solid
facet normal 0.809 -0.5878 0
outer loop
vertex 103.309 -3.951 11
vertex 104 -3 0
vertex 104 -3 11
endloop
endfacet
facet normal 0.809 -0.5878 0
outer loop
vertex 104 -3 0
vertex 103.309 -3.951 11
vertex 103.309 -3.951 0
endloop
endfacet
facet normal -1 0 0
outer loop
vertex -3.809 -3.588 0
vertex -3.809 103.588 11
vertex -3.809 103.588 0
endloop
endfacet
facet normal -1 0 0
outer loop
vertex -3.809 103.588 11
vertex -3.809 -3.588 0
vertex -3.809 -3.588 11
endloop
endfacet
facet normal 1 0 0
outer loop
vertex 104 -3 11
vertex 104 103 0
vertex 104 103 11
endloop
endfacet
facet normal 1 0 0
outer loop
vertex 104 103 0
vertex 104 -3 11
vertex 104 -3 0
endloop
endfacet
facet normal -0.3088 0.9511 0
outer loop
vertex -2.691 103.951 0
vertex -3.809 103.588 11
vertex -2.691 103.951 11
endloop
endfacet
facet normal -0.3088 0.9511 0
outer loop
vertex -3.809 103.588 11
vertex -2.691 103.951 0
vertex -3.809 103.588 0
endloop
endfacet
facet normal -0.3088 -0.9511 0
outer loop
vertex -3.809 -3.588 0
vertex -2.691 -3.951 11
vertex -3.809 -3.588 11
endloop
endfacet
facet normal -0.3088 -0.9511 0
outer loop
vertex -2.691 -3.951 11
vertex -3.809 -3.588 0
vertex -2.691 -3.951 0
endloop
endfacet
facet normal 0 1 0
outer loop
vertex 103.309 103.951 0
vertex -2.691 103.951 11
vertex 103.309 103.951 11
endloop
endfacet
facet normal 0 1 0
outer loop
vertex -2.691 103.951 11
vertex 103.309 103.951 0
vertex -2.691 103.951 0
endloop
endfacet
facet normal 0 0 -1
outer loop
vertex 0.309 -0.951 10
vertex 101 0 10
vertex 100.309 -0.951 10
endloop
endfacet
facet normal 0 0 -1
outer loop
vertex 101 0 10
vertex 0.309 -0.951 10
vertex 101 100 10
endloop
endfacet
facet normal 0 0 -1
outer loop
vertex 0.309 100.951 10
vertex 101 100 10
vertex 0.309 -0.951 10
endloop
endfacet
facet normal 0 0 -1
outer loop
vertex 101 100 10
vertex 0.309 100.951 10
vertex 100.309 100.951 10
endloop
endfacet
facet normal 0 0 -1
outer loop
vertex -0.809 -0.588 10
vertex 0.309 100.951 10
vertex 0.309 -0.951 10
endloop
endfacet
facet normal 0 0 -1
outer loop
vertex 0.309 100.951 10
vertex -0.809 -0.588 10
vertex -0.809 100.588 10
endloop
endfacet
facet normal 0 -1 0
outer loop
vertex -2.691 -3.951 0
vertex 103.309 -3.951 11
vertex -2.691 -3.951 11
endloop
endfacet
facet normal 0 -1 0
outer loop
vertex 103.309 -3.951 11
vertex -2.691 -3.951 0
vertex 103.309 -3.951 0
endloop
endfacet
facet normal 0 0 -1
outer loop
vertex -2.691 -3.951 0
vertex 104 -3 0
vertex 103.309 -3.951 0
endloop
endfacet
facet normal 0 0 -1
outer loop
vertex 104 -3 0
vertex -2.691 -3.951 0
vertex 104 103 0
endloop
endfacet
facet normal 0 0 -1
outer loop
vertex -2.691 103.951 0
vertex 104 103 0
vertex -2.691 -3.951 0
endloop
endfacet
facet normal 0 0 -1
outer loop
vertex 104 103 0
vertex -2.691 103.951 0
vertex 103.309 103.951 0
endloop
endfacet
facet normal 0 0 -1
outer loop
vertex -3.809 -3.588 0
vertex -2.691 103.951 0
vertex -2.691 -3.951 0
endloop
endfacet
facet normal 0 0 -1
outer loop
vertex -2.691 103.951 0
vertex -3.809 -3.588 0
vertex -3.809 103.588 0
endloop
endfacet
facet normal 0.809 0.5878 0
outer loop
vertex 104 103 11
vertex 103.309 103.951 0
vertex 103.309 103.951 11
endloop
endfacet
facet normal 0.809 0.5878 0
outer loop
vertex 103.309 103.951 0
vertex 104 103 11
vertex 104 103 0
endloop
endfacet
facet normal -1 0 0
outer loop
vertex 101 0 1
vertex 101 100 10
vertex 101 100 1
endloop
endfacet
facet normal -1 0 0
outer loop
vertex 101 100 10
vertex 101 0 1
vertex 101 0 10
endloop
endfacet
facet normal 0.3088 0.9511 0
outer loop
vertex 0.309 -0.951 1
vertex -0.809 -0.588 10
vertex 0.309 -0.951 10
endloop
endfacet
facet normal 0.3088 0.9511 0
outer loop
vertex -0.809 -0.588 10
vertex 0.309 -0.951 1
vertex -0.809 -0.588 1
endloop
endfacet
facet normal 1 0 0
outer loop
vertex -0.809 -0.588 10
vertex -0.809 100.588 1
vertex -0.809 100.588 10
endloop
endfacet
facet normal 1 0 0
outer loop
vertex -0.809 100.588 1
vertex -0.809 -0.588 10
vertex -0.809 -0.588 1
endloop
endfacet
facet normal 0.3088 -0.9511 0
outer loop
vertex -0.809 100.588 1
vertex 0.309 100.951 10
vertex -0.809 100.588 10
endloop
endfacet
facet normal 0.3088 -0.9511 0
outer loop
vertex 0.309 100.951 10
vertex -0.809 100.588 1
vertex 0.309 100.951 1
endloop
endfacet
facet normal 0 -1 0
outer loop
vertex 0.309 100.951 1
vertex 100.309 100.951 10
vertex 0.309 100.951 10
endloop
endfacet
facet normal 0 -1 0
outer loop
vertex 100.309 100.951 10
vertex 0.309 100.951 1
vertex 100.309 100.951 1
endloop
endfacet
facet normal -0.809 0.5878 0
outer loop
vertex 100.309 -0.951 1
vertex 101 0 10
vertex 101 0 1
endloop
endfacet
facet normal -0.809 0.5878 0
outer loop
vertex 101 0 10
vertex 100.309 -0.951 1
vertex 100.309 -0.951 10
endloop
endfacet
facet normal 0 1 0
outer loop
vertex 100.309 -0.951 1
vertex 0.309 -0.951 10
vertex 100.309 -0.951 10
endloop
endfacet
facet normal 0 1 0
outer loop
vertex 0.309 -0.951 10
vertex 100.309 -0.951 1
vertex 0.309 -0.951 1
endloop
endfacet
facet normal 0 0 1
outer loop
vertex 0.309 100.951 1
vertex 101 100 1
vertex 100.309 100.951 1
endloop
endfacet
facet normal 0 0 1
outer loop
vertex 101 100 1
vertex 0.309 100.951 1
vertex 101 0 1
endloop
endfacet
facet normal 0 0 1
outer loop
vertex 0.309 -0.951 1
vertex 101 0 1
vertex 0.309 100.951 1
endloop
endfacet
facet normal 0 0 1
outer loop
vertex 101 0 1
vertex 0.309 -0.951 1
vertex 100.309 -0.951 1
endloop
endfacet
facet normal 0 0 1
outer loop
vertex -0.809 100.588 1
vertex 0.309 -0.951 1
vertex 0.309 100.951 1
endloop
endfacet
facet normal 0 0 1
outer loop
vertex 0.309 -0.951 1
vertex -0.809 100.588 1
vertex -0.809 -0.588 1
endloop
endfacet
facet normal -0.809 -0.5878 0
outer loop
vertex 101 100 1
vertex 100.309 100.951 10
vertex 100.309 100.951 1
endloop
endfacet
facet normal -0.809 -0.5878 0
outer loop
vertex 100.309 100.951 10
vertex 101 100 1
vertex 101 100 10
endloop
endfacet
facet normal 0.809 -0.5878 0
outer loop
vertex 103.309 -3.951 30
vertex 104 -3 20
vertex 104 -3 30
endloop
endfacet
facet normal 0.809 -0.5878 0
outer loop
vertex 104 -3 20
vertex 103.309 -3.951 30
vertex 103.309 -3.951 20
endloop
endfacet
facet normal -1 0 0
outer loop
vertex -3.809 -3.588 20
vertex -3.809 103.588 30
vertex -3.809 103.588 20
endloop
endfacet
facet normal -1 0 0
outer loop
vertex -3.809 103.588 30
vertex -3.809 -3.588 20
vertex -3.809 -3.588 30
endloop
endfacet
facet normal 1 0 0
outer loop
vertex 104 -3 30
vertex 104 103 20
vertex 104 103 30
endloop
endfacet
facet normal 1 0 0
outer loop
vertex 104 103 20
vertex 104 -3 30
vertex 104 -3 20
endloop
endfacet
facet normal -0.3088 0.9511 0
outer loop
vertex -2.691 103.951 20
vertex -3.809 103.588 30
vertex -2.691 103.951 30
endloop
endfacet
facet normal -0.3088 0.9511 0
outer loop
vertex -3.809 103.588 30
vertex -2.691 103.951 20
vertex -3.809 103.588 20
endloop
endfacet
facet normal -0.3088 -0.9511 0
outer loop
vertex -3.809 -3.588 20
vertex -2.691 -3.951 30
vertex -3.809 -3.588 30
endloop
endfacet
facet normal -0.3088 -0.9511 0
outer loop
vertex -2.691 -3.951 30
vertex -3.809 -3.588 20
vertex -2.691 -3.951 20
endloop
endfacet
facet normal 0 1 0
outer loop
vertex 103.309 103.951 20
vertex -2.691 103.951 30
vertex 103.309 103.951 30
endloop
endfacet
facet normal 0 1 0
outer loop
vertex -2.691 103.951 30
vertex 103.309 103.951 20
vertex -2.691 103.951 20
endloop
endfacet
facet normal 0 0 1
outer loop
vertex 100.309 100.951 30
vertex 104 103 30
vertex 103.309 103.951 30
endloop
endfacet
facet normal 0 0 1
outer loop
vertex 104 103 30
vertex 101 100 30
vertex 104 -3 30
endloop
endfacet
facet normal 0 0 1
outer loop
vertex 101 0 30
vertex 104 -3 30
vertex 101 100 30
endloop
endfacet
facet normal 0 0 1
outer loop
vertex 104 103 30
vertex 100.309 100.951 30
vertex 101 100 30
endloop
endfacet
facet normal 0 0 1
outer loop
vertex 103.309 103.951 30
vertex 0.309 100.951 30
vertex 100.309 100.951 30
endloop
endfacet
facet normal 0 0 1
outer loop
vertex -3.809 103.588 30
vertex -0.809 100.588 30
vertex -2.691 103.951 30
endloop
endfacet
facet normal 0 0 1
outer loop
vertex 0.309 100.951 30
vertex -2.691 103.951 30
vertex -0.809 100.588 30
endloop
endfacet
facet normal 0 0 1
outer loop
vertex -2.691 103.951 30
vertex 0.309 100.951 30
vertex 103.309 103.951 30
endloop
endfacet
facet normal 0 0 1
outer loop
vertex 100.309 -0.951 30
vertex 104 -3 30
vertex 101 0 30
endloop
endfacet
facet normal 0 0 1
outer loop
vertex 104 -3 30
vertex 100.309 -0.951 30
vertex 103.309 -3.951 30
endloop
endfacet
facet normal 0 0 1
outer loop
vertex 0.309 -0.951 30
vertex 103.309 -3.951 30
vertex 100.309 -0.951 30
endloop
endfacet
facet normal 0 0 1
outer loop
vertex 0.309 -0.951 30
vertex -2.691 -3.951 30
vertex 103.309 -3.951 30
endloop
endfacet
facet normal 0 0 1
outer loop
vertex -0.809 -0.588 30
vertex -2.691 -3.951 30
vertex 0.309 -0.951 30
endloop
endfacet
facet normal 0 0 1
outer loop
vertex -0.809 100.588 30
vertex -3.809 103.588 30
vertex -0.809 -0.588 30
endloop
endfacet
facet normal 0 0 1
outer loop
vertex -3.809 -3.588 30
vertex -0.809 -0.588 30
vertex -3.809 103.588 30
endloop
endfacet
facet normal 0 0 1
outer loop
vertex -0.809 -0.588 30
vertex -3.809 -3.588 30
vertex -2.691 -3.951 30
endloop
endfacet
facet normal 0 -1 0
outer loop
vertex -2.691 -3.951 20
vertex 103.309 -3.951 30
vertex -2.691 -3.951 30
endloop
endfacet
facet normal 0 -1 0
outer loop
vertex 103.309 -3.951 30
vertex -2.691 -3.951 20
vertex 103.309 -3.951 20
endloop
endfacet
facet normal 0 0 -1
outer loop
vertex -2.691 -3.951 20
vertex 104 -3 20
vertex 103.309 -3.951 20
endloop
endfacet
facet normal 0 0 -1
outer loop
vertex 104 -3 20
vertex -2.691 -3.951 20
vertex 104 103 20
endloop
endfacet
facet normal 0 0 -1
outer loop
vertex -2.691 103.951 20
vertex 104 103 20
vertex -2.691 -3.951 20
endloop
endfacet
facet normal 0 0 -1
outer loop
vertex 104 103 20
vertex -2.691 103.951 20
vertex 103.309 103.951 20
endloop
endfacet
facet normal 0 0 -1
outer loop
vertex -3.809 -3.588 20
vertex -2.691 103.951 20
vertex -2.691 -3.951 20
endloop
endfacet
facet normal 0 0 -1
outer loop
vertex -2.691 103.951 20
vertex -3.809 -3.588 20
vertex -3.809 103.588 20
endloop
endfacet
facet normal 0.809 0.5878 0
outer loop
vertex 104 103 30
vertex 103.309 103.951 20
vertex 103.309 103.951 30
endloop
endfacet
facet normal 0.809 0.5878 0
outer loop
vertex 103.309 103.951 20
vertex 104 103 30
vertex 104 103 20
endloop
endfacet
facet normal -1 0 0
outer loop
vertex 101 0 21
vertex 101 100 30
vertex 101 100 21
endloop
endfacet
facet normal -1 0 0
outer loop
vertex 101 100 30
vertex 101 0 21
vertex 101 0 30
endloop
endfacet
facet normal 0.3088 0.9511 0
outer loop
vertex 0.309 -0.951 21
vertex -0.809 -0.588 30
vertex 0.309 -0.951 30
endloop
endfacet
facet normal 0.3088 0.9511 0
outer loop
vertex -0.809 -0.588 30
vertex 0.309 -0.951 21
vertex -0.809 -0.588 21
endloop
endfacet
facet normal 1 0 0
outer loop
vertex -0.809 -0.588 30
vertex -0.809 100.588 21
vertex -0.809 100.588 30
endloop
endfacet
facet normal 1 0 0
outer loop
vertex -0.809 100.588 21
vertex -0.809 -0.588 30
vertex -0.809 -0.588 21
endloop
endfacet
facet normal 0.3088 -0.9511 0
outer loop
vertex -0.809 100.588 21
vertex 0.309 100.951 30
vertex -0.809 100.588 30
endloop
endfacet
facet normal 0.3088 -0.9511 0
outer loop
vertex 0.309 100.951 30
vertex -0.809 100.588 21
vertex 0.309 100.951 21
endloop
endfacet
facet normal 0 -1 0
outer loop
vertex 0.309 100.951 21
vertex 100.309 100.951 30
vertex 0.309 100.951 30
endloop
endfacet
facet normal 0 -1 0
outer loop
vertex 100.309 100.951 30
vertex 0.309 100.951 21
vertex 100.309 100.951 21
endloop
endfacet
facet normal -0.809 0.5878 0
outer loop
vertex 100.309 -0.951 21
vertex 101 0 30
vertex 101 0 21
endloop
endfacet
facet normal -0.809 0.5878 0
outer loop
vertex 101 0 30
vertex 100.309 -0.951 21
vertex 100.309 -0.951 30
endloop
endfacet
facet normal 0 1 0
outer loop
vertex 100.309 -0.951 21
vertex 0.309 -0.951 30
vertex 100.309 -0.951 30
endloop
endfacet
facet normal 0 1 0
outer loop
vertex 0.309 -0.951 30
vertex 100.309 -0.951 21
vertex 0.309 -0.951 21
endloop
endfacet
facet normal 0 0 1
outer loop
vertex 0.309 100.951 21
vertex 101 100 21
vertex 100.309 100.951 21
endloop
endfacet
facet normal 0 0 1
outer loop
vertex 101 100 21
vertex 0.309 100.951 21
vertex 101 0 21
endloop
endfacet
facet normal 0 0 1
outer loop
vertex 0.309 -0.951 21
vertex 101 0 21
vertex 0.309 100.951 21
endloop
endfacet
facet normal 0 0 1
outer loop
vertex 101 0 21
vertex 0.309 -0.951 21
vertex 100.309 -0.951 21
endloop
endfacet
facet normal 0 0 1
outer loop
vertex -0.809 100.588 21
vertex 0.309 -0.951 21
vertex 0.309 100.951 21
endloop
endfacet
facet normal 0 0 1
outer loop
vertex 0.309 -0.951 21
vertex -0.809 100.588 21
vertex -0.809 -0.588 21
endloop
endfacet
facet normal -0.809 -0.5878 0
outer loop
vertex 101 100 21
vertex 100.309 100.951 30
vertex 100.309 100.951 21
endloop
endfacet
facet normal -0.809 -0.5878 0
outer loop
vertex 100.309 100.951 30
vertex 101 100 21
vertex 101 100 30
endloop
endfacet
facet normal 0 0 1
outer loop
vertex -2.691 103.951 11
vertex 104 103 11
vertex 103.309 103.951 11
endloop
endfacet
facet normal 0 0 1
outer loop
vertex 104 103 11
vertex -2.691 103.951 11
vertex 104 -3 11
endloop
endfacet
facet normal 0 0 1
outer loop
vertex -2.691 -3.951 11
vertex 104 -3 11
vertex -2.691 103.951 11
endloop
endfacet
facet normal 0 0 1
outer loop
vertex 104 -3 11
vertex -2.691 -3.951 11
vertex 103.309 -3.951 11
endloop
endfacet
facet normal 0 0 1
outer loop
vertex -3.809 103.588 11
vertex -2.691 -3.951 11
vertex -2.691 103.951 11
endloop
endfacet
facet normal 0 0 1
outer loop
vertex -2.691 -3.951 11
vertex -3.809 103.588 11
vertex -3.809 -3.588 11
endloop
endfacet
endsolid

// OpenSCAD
// file: case.scad
module case (width, length, wall_height, wall_thickness, x_offset, y_offset, z_offset){
    //Negative space
    top_right_point = [width + x_offset, length + y_offset, z_offset];
    top_left_point = [width + x_offset, y_offset, z_offset];
    bottom_right_point = [x_offset, length + y_offset, z_offset];
    bottom_left_point = [x_offset, y_offset, z_offset];

    //Base space
    top_right_point_base = [width + wall_thickness, length + wall_thickness, 0];
    top_left_point_base = [width + wall_thickness, -wall_thickness, 0];
    bottom_right_point_base = [-wall_thickness, length + wall_thickness, 0];
    bottom_left_point_base = [-wall_thickness, -wall_thickness, 0];
    
    //Lists for the for loops
    base_points = [top_right_point_base, top_left_point_base, bottom_right_point_base, bottom_left_point_base];
    points = [top_right_point, top_left_point, bottom_right_point, bottom_left_point];

    difference(){
        hull(){
            for (point = base_points){
                translate(point){
                    cylinder(wall_height);
                }
            }
        }
        hull(){
            for (point = points){
                translate(point){
                    cylinder(wall_height);
                }
            }
        }
    }
}

module roofed_case(width, length, wall_height, wall_thickness, x_offset, y_offset, z_offset, roof_thickness){
    case(width, length, wall_height, wall_thickness, x_offset, y_offset, z_offset);
    top_right_point_base = [width + wall_thickness, length + wall_thickness, wall_height];
    top_left_point_base = [width + wall_thickness, -wall_thickness, wall_height ];
    bottom_right_point_base = [-wall_thickness, length + wall_thickness, wall_height];
    bottom_left_point_base = [-wall_thickness, -wall_thickness, wall_height];
    points = [top_right_point_base, top_left_point_base, bottom_right_point_base, bottom_left_point_base];
    hull(){
           for(point = points){
               translate(point) cylinder(roof_thickness);
           }
    }
    
}

//Changeable values
width = 100;
length = 100;
wall_height = 100000;
x_offset = 0;
y_offset = 0;
z_offset = 1;
wall_thickness = 3;
roof_thickness = 3;

/*
//Non-changeable values
height = z_offset + wall_height;
*/

//This is for making sure it renders correctly
translate([0, 0, wall_height + 10]){
    case(width,
        length,
        wall_height,
        wall_thickness,
        x_offset,
        y_offset,
        z_offset);
}

roofed_case(width,
     length,
     wall_height,
     wall_thickness,
     x_offset,
     y_offset,
     z_offset);
// main file
include<case.scad>

//Changeable values
width = 100;
length = 100;
wall_height = 10;
x_offset = 0;
y_offset = 0;
z_offset = 1;
wall_thickness = 3;

//Non-changeable values
height = z_offset + wall_height;

case(width,
     length,
     wall_height,
     wall_thickness,
     x_offset,
     y_offset,
     z_offset);
